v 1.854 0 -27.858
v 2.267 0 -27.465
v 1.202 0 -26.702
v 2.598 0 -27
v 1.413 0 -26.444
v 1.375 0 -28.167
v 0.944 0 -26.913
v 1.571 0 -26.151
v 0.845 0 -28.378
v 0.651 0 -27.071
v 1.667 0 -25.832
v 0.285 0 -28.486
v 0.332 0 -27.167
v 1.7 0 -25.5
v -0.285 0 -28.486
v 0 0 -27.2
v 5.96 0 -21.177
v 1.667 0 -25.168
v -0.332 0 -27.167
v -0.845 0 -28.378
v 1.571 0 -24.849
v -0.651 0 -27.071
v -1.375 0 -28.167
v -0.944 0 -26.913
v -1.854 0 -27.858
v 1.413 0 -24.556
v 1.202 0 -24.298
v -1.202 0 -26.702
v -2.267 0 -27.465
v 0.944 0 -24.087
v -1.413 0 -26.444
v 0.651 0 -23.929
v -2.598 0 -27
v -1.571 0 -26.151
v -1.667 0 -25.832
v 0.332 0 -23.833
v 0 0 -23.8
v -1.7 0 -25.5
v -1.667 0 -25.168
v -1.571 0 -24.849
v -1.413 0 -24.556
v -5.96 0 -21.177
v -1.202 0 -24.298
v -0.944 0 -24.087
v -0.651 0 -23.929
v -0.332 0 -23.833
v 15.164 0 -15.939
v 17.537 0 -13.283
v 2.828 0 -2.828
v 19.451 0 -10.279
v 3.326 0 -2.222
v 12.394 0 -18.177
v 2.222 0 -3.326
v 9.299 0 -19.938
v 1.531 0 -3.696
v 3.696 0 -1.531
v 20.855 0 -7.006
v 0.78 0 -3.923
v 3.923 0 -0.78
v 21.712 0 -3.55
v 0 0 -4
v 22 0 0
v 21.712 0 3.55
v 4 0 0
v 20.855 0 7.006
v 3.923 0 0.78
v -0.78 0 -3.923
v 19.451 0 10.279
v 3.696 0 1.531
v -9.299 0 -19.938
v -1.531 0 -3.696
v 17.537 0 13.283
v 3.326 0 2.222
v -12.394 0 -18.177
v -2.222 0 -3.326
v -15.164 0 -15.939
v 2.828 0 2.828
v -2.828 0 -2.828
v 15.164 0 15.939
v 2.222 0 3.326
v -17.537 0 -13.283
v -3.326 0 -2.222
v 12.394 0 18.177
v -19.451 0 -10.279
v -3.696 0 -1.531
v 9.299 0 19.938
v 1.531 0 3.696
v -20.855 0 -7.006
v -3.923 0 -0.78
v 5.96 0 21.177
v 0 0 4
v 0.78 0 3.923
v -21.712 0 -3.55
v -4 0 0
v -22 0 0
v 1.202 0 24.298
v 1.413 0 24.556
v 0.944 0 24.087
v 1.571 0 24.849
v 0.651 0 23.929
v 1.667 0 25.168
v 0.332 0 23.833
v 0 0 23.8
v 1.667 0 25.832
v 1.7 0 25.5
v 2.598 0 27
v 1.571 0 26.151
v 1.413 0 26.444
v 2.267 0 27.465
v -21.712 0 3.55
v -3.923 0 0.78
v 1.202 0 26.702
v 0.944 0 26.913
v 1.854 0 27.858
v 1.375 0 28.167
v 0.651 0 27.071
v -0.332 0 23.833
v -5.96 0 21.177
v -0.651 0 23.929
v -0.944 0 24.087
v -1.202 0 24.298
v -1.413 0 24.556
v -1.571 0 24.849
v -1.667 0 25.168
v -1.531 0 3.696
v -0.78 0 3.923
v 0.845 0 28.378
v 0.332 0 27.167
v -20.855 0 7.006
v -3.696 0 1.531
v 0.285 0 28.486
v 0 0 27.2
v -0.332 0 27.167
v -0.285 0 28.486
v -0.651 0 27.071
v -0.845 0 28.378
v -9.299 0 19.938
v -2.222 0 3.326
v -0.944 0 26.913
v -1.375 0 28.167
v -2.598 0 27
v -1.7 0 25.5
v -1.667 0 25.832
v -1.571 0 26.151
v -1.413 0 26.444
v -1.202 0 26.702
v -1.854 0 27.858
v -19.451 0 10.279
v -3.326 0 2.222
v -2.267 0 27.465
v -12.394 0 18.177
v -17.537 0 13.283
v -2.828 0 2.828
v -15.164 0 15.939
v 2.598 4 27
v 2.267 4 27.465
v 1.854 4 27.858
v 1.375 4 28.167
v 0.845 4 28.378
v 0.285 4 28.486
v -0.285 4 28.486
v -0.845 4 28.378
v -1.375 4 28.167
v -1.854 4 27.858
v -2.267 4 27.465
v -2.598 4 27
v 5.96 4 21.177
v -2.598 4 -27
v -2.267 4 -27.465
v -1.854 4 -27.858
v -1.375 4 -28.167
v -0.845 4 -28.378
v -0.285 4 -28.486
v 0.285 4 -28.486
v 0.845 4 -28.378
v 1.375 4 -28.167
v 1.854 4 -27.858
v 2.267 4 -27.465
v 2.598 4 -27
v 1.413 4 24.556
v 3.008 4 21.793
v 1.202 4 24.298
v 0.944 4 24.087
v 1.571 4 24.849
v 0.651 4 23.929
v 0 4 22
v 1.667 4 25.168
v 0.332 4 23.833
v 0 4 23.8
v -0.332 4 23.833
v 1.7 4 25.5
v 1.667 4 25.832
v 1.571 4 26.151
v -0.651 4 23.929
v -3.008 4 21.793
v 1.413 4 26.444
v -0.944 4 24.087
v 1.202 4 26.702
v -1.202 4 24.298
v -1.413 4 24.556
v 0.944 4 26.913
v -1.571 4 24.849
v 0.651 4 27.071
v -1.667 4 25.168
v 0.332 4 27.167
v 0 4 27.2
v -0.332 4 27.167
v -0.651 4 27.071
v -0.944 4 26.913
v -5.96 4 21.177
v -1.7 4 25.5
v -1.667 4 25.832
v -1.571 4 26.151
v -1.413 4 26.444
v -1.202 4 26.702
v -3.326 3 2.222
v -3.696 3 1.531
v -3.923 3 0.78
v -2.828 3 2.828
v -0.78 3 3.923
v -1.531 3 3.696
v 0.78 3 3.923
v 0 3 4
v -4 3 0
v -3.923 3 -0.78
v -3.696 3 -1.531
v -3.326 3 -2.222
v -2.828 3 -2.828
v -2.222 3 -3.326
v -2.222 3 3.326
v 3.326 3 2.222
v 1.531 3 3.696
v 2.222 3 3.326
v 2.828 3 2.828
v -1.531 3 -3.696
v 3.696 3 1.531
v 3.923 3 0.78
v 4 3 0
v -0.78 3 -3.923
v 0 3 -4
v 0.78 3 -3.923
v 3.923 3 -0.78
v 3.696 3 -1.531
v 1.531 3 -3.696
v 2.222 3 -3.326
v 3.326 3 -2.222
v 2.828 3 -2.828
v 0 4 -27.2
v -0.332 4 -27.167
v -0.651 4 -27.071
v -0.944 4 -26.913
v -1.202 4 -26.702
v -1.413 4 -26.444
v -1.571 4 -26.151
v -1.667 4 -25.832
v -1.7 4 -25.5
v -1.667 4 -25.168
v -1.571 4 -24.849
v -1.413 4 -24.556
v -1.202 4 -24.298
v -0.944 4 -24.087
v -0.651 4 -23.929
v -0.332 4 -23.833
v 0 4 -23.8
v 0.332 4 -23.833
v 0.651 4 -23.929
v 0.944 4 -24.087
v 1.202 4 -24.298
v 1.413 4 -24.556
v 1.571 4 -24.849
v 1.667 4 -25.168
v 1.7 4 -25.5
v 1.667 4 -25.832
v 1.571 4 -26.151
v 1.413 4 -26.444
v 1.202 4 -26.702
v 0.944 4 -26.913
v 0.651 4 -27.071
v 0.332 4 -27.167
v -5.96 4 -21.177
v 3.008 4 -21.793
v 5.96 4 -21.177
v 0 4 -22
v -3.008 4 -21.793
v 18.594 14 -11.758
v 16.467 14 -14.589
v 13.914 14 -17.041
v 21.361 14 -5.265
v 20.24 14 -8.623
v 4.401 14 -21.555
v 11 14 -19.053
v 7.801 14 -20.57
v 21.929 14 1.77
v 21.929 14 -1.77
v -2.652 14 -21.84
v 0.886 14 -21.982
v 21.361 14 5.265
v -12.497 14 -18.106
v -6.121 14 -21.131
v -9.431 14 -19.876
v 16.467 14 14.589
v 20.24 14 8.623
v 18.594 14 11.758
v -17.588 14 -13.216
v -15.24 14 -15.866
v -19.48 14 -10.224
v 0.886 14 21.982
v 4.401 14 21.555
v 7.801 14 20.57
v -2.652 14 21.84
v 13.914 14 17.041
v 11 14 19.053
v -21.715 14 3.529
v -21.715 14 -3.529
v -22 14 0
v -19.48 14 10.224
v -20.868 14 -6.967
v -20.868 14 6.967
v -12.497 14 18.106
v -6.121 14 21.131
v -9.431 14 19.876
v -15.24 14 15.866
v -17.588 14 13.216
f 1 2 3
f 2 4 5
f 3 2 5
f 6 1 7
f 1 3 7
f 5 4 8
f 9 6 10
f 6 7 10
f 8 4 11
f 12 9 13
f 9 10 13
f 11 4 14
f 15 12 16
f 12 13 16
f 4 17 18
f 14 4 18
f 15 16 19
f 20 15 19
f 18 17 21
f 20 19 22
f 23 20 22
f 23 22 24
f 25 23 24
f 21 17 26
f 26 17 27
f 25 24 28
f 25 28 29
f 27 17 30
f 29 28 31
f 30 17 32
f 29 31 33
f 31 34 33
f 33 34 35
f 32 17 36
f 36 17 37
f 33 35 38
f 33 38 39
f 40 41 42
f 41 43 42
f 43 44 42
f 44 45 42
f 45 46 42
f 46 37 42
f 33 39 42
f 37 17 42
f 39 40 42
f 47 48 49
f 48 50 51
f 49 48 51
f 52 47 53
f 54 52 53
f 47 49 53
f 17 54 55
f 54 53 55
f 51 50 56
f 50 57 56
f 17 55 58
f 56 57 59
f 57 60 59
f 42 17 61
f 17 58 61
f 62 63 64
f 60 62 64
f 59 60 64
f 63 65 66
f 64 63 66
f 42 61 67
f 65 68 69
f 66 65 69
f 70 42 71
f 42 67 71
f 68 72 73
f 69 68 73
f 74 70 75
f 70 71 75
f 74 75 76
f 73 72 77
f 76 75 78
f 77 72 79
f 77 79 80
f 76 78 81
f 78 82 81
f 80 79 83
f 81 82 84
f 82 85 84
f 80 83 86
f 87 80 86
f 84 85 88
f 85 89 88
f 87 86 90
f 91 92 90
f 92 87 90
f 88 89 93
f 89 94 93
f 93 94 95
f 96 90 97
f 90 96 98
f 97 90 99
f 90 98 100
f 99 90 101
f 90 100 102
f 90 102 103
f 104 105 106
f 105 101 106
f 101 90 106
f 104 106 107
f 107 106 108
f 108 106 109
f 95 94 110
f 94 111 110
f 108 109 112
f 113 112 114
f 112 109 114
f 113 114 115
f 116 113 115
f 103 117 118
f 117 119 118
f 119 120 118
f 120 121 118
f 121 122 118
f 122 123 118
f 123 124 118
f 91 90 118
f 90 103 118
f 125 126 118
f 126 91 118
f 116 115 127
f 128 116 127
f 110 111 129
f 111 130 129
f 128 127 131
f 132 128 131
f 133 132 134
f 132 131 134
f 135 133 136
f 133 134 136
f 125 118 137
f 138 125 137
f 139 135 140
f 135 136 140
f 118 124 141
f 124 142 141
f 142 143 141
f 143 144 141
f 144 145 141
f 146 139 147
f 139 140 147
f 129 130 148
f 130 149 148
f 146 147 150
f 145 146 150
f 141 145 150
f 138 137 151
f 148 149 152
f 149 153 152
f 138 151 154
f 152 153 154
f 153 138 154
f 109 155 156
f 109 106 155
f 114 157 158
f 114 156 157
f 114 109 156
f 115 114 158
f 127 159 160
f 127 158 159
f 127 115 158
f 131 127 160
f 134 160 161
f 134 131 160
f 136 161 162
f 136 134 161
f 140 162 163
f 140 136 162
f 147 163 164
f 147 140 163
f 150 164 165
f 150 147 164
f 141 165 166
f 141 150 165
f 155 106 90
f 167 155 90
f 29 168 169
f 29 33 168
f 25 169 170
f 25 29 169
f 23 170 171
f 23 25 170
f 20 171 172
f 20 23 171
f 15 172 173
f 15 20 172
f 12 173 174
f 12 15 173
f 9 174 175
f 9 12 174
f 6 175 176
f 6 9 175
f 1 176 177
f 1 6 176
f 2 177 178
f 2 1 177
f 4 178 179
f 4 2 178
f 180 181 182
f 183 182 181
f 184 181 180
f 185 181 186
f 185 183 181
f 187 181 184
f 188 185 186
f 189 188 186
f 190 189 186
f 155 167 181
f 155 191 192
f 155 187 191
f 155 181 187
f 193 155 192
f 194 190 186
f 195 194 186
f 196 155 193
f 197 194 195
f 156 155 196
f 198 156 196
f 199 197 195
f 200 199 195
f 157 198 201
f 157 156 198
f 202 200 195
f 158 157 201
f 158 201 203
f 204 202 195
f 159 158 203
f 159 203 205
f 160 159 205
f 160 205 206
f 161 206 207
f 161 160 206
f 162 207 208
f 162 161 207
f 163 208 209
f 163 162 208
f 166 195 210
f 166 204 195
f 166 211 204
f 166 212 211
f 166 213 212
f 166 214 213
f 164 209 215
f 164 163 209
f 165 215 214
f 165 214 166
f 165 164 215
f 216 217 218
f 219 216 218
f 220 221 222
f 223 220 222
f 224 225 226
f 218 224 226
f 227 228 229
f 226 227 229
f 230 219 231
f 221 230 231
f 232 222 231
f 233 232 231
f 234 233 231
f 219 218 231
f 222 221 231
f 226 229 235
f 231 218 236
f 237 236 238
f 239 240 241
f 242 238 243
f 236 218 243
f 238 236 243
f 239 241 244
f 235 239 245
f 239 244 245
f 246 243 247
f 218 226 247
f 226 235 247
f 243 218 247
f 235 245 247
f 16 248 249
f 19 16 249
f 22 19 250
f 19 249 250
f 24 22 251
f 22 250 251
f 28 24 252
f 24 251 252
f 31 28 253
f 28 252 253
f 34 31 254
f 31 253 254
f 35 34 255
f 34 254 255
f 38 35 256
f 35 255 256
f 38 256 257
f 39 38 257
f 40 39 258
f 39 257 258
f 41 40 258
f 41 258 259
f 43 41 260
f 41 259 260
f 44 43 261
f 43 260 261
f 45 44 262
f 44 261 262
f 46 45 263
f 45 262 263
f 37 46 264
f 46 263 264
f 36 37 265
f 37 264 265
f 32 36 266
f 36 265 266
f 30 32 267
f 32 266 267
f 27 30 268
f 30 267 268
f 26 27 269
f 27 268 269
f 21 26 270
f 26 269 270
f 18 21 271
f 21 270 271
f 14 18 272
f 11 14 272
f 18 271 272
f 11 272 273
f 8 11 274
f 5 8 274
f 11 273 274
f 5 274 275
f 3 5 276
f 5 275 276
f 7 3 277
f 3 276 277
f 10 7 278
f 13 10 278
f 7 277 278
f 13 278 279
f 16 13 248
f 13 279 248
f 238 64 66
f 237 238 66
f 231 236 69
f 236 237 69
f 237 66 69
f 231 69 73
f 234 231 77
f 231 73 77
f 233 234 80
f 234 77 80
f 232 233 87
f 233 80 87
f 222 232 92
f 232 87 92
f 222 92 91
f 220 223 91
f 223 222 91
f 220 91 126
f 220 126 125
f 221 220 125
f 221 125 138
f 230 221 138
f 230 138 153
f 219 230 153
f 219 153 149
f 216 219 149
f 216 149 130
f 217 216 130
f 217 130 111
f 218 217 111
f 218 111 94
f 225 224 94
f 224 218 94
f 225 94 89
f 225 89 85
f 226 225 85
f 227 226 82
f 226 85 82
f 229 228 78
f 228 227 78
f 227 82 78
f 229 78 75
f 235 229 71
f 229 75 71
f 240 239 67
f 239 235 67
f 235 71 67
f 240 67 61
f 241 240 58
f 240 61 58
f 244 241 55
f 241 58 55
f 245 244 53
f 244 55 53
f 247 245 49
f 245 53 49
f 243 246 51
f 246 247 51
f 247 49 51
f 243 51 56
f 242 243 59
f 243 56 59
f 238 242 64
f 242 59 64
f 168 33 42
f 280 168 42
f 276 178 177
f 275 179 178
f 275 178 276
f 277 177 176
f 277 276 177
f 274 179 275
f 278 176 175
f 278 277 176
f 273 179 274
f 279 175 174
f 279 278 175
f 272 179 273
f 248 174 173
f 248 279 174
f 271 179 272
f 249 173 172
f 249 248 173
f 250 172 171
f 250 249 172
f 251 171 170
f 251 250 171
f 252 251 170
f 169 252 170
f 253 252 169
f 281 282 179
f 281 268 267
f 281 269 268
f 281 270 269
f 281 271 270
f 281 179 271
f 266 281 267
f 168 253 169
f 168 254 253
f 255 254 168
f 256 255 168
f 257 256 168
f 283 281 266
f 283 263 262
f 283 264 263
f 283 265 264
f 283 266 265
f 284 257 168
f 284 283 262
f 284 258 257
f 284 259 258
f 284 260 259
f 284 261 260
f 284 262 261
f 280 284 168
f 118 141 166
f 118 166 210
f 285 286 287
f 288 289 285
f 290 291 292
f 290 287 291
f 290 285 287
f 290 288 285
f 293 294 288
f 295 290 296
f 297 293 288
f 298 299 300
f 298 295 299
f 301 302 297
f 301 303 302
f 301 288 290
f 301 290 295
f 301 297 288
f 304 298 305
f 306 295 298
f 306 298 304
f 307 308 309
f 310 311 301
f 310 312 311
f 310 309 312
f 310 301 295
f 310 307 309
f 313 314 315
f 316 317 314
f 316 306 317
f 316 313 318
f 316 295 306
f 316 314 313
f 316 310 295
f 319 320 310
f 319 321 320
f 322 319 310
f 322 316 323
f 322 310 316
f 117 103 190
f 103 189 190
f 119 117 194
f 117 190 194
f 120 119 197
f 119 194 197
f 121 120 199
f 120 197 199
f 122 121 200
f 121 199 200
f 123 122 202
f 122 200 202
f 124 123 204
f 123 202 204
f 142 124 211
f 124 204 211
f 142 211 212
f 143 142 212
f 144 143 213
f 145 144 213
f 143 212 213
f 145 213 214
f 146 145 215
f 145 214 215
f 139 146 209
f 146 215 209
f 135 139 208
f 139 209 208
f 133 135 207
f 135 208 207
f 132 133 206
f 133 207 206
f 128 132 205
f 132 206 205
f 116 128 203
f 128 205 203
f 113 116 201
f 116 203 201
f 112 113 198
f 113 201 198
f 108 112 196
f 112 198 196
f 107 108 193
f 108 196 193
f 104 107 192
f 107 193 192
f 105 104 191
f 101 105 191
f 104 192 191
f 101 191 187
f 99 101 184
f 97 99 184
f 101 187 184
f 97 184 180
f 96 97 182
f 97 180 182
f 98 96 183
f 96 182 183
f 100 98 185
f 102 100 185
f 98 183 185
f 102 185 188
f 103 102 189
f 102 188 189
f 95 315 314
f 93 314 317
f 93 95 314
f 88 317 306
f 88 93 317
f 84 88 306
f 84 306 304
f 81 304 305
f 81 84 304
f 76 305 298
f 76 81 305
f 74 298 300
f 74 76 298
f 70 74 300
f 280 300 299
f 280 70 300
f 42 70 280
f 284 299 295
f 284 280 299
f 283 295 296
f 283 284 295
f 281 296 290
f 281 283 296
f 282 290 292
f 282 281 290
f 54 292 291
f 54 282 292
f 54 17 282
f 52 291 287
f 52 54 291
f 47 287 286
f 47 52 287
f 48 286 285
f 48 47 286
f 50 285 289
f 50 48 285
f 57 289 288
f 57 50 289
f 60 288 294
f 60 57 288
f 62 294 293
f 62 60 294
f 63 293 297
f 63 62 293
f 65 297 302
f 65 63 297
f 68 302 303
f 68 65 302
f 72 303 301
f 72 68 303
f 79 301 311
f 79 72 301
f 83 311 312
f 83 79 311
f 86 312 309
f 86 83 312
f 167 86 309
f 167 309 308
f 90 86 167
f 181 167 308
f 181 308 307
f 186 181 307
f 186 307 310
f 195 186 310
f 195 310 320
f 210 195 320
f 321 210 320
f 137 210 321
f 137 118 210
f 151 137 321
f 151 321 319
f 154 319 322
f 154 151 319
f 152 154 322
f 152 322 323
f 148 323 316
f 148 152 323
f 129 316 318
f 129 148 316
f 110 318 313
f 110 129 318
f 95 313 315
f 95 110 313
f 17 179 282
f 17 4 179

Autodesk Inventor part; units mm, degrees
ref_plane "YZ Plane" through (0, 0, 0) normal (1, 0, 0) x (0, 1, 0)
ref_plane "XZ Plane" through (0, 0, 0) normal (0, 1, 0) x (-1, 0, 0)
ref_plane "XY Plane" through (0, 0, 0) normal (0, 0, 1) x (1, 0, 0)
sketch "Sketch1" plane through (0, 0, 0) normal (0, 1, 0) x (-1, 0, 0)
  circle A0 centre (0, 0) radius 22
  circle A1 centre (0, -25.5) radius 3
  line L0 (2.5981, -27) -> (5.9598, -21.1774)
  line L1 (-2.5981, -27) -> (-5.9598, -21.1774)
  line L2 (30.8, 0) -> (-30.8, 0) projected
  circle A2 centre (0, 25.5) radius 3
  line L3 (2.5981, 27) -> (5.9598, 21.1774)
  line L4 (-2.5981, 27) -> (-5.9598, 21.1774)
  point P0 (5.9598, 21.1774)
  point P1 (-5.9598, 21.1774)
  dimension "d0" = 44
  dimension "d1" = 60
  dimension "d2" = 6
  dimension "d3" = 51
extrude "Extrusion1" add sketch "Sketch1" along normal blind 14 contours L2 A0 | A0 L2
extrude "Extrusion2" add sketch "Sketch1" along normal blind 4 contours A0 L4 A2 L3 | L0 A1 L1 A0 | A2 | A1
hole "Hole1" at (0, 0, -25.5) at (0, 0, 25.5) direction (0, 1, 0) diameter 3.4 depth 4 clearance for "Socket Head Cap Screw ISO 4762" size "M3" standard "ISO"
sketch "Sketch2" plane through (0, 0, 0) normal (0, 1, 0) x (1, 0, 0)
  circle A0 centre (0, 0) radius 4
  dimension "d15" = 8
extrude "Extrusion3" cut sketch "Sketch2" along normal blind 3
properties part number "speaker"
